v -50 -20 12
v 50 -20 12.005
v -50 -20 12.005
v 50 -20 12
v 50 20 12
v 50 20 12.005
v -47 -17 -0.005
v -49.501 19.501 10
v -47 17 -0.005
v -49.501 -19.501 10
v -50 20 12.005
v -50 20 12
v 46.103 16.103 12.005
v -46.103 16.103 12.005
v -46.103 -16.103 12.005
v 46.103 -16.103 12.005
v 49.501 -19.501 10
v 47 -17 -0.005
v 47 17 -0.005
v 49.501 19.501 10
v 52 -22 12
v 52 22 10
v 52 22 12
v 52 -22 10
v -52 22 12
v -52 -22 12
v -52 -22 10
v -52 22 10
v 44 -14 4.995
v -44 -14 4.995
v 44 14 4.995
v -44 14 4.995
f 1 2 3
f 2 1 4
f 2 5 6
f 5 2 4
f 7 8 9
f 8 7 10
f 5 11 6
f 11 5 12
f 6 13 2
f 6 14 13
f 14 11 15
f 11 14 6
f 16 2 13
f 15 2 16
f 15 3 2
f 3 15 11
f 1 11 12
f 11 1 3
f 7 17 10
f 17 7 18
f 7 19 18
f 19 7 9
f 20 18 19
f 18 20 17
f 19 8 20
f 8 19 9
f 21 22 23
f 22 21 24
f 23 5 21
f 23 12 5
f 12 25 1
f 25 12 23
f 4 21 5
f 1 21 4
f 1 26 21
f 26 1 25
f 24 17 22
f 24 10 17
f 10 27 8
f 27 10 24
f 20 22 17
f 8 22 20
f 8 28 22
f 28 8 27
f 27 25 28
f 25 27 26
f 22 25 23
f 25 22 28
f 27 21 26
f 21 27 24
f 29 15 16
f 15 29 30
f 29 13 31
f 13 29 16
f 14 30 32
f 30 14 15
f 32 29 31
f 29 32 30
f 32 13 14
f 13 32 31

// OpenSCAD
$fn=64;

L = 100;
W = 40;
H = 12;

flange_overhang = 2;
flange_thk = 2;

wall_taper = 3;          // outward growth from bottom to top (per side)
bottom_margin = 3;       // bottom rim thickness around inner cavity

recess_depth = 2.5;
recess_margin = 6;

slot_len = 70;
slot_w = 4;
slot_depth = recess_depth + 1;

module frustum_box(size_bottom=[10,10,10], size_top=[12,12,10], h=10){
    hull(){
        translate([0,0,0]) cube([size_bottom[0], size_bottom[1], 0.01], center=true);
        translate([0,0,h]) cube([size_top[0], size_top[1], 0.01], center=true);
    }
}

module outer_shell(){
    union(){
        frustum_box(
            size_bottom=[L - 2*wall_taper, W - 2*wall_taper, H],
            size_top=[L, W, H],
            h=H
        );
        translate([0,0,H - flange_thk/2])
            cube([L + 2*flange_overhang, W + 2*flange_overhang, flange_thk], center=true);
    }
}

module inner_cavity(){
    frustum_box(
        size_bottom=[(L - 2*wall_taper) - 2*bottom_margin, (W - 2*wall_taper) - 2*bottom_margin, H],
        size_top=[L - 2*bottom_margin, W - 2*bottom_margin, H],
        h=H - flange_thk
    );
}

module recessed_panel_cut(){
    translate([0,0,H - flange_thk - recess_depth/2])
        cube([L - 2*recess_margin, W - 2*recess_margin, recess_depth], center=true);
}

module slot_cut(){
    translate([0,0,H - flange_thk - recess_depth + slot_depth/2])
        cube([slot_len, slot_w, slot_depth], center=true);
}

difference(){
    outer_shell();
    translate([0,0,(H - flange_thk)/2])
        inner_cavity();
    recessed_panel_cut();
    slot_cut();
}
